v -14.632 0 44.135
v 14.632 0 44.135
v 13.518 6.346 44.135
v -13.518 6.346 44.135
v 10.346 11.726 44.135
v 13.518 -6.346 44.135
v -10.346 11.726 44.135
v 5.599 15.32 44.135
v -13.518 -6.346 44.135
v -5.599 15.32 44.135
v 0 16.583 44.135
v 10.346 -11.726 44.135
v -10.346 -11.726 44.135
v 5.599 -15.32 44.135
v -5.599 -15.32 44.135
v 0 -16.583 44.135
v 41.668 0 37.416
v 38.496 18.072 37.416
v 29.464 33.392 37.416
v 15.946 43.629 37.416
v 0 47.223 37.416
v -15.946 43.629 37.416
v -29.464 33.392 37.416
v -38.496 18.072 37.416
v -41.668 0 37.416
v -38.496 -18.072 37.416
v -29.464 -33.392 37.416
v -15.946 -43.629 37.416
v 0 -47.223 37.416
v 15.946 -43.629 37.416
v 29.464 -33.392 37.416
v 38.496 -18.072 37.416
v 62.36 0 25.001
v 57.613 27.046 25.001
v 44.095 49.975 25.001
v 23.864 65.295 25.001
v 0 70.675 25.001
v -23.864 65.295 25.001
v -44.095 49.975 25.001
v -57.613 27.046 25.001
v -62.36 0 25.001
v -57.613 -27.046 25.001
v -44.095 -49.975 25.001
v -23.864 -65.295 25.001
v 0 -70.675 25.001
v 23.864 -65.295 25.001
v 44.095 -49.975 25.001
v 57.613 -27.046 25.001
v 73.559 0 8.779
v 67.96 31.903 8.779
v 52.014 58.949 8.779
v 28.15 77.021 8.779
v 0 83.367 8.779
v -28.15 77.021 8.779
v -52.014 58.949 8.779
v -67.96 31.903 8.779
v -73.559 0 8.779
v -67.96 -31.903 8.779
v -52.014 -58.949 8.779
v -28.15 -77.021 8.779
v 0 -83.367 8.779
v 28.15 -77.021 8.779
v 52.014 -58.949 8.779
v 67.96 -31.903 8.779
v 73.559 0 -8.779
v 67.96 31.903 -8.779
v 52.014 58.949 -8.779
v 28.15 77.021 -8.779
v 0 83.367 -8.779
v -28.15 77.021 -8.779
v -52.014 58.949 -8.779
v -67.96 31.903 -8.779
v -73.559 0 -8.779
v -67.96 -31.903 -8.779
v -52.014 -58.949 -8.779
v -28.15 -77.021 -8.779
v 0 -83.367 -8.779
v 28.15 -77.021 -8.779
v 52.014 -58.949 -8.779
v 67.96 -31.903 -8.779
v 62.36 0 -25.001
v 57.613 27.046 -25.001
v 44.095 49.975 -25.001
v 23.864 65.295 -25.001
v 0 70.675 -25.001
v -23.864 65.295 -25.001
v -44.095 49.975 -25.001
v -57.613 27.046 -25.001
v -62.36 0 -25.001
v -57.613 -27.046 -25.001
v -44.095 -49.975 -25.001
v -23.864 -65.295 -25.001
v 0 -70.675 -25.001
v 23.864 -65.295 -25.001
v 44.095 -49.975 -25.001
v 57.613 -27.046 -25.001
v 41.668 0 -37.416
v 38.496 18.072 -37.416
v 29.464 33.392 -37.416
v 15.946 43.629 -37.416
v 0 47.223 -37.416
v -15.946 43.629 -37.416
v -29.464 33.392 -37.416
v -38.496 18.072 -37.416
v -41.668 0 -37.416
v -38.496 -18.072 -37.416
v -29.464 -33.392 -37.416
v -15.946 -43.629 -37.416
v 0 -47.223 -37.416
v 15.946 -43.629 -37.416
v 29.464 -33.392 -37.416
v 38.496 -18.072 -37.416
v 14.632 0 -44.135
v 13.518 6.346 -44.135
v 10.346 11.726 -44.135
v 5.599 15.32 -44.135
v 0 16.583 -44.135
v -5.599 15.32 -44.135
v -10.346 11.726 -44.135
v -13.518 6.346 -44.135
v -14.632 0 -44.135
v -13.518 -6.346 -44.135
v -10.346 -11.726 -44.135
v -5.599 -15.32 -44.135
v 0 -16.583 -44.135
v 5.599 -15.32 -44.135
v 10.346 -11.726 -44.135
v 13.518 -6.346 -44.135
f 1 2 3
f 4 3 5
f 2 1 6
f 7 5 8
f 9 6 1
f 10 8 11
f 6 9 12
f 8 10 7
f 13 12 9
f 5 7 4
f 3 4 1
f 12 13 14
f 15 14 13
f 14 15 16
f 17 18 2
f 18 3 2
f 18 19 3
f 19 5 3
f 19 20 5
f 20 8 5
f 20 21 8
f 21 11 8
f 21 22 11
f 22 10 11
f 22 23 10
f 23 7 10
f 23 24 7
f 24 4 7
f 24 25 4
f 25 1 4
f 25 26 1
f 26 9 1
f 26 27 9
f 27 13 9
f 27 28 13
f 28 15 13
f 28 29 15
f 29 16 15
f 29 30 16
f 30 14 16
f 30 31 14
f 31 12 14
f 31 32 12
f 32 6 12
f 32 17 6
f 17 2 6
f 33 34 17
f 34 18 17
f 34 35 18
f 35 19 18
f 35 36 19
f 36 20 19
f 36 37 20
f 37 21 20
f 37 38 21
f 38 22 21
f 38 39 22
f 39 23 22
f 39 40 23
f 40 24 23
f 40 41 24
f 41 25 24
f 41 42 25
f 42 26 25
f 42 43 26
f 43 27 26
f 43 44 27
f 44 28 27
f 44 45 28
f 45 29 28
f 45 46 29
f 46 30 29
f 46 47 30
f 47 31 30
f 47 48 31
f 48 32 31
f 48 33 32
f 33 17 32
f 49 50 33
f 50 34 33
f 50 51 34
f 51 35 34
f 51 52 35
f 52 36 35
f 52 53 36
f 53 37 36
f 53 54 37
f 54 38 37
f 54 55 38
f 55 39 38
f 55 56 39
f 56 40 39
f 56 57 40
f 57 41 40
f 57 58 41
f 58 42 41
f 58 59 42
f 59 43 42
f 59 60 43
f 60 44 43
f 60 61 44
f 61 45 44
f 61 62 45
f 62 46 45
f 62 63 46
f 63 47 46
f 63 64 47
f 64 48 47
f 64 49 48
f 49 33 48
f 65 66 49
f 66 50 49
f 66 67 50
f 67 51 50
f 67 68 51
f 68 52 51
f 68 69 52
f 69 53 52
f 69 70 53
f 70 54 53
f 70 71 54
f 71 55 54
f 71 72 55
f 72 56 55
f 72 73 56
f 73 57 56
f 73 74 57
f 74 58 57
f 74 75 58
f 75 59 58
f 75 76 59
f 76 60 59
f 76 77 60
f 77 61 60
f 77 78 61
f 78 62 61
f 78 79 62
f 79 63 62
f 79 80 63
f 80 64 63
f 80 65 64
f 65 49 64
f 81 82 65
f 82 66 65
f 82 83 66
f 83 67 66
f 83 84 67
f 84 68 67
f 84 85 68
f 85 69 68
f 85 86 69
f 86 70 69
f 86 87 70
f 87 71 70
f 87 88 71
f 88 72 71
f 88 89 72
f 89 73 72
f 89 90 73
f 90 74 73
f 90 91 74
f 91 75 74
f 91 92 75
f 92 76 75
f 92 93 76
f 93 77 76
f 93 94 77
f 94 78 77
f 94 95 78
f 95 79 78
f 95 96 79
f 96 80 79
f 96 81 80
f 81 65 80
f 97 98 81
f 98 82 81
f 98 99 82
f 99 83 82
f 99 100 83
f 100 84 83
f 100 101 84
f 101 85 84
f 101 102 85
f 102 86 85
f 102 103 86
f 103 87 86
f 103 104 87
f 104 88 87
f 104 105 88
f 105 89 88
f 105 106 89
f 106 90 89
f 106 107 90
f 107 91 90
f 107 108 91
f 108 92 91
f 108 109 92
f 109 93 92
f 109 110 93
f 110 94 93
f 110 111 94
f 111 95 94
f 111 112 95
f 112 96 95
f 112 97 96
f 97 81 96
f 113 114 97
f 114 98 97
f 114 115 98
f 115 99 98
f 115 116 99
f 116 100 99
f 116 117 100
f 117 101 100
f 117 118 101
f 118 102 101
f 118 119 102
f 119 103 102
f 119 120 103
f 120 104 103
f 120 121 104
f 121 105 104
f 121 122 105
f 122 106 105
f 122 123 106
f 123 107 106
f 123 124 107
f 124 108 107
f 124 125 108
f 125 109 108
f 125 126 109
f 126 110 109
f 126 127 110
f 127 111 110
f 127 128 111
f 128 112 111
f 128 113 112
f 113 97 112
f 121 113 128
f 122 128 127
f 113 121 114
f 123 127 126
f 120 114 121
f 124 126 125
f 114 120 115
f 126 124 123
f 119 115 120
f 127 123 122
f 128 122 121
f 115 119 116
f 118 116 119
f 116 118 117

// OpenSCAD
// Generated by SolidPython 1.0.1 on 2020-07-29 00:46:52


scale(v = [15, 17, 9]) {
	sphere(r = 5);
}
/***********************************************
*********      SolidPython code:      **********
************************************************
 
# import packages: SolidPython
from solid import *
from solid.utils import *
from itertools import chain, combinations, permutations


class Resize:

    def __init__(self, scad_file):
        self.scad_file = scad_file
        #self.scad_file = import_scad(scad_file)
        # cone/cylinder param:
        self.r1 = 0
        self.r2 = 0
        self.h = 0
        # rectangular prism param:
        self.w = 0
        self.l = 0
        # ellipse param:
        self.r = 0

    # import OpenScad code (file name corresponds to shape)


    # classify shape + parameters
    def assign(self, param1, param2, param3):
        if self.scad_file == 'cone.scad':
            self.r1 = param1
            self.r2 = param2
            self.h = param3
        elif self.scad_file == 'cylinder.scad':
            self.r1 = param1
            self.r2 = param2
            self.h = param3
        elif self.scad_file == 'rectangularPrism.scad':
            self.h = param1
            self.l = param2
            self.w = param3
        else:
            self.r = param1
            self.h = param2

    # resize parameters
    def iterate(self):
        x = range(3, 20, 2)
        i = 1
        if self.scad_file == 'cone.scad':
            tempList = list(permutations(x, 2))
            for temp in tempList:
                param1 = temp[0]
                param2 = temp[1]
                filepath = 'produced_scad_files/' + 'cone' + str(param1) + '_' + str(param2) + '_' + '.scad'
                scad_render_to_file(cylinder(h=param1, r1=param2, r2=0), filepath)

        elif self.scad_file == 'cylinder.scad':
            tempList = list(permutations(x, 3))
            for temp in tempList:
                param1 = temp[0]
                param2 = temp[1]
                filepath = 'produced_scad_files/' + 'cylinder' + str(param1) + '_' + str(param2) + '_' + '.scad'
                scad_render_to_file(cylinder(h=param1, r1=param2, r2=param2), filepath)

        elif self.scad_file == 'rectangularPrism.scad':
            tempList = list(permutations(x, 3))
            for temp in tempList:
                param1 = temp[0]
                param2 = temp[1]
                param3 = temp[2]
                filepath = 'produced_scad_files/' + 'rectangularPrism' + str(param1) + '_' + str(param2) + '_' + str(
                    param3) + '.scad'
                scad_render_to_file(cube(size=(param1, param2, param3)), filepath)

        elif self.scad_file == 'ellipse.scad':
            tempList = list(permutations(x, 4))
            for temp in tempList:
                param1 = temp[0]
                param2 = temp[1]
                param3 = temp[2]
                param4 = temp[3]
                filepath = 'produced_scad_files/' + 'ellipse' + str(param1) + '_' + str(param2) + '_' + str(param3) + '_' + str(param4) + '.scad'
                scad_render_to_file(scale([param1, param2, param3])(sphere(r=param4)), filepath)

    def render_to_scadfile(self):
        scad_render_to_file(scad, 'example.scad') 
 
************************************************/
